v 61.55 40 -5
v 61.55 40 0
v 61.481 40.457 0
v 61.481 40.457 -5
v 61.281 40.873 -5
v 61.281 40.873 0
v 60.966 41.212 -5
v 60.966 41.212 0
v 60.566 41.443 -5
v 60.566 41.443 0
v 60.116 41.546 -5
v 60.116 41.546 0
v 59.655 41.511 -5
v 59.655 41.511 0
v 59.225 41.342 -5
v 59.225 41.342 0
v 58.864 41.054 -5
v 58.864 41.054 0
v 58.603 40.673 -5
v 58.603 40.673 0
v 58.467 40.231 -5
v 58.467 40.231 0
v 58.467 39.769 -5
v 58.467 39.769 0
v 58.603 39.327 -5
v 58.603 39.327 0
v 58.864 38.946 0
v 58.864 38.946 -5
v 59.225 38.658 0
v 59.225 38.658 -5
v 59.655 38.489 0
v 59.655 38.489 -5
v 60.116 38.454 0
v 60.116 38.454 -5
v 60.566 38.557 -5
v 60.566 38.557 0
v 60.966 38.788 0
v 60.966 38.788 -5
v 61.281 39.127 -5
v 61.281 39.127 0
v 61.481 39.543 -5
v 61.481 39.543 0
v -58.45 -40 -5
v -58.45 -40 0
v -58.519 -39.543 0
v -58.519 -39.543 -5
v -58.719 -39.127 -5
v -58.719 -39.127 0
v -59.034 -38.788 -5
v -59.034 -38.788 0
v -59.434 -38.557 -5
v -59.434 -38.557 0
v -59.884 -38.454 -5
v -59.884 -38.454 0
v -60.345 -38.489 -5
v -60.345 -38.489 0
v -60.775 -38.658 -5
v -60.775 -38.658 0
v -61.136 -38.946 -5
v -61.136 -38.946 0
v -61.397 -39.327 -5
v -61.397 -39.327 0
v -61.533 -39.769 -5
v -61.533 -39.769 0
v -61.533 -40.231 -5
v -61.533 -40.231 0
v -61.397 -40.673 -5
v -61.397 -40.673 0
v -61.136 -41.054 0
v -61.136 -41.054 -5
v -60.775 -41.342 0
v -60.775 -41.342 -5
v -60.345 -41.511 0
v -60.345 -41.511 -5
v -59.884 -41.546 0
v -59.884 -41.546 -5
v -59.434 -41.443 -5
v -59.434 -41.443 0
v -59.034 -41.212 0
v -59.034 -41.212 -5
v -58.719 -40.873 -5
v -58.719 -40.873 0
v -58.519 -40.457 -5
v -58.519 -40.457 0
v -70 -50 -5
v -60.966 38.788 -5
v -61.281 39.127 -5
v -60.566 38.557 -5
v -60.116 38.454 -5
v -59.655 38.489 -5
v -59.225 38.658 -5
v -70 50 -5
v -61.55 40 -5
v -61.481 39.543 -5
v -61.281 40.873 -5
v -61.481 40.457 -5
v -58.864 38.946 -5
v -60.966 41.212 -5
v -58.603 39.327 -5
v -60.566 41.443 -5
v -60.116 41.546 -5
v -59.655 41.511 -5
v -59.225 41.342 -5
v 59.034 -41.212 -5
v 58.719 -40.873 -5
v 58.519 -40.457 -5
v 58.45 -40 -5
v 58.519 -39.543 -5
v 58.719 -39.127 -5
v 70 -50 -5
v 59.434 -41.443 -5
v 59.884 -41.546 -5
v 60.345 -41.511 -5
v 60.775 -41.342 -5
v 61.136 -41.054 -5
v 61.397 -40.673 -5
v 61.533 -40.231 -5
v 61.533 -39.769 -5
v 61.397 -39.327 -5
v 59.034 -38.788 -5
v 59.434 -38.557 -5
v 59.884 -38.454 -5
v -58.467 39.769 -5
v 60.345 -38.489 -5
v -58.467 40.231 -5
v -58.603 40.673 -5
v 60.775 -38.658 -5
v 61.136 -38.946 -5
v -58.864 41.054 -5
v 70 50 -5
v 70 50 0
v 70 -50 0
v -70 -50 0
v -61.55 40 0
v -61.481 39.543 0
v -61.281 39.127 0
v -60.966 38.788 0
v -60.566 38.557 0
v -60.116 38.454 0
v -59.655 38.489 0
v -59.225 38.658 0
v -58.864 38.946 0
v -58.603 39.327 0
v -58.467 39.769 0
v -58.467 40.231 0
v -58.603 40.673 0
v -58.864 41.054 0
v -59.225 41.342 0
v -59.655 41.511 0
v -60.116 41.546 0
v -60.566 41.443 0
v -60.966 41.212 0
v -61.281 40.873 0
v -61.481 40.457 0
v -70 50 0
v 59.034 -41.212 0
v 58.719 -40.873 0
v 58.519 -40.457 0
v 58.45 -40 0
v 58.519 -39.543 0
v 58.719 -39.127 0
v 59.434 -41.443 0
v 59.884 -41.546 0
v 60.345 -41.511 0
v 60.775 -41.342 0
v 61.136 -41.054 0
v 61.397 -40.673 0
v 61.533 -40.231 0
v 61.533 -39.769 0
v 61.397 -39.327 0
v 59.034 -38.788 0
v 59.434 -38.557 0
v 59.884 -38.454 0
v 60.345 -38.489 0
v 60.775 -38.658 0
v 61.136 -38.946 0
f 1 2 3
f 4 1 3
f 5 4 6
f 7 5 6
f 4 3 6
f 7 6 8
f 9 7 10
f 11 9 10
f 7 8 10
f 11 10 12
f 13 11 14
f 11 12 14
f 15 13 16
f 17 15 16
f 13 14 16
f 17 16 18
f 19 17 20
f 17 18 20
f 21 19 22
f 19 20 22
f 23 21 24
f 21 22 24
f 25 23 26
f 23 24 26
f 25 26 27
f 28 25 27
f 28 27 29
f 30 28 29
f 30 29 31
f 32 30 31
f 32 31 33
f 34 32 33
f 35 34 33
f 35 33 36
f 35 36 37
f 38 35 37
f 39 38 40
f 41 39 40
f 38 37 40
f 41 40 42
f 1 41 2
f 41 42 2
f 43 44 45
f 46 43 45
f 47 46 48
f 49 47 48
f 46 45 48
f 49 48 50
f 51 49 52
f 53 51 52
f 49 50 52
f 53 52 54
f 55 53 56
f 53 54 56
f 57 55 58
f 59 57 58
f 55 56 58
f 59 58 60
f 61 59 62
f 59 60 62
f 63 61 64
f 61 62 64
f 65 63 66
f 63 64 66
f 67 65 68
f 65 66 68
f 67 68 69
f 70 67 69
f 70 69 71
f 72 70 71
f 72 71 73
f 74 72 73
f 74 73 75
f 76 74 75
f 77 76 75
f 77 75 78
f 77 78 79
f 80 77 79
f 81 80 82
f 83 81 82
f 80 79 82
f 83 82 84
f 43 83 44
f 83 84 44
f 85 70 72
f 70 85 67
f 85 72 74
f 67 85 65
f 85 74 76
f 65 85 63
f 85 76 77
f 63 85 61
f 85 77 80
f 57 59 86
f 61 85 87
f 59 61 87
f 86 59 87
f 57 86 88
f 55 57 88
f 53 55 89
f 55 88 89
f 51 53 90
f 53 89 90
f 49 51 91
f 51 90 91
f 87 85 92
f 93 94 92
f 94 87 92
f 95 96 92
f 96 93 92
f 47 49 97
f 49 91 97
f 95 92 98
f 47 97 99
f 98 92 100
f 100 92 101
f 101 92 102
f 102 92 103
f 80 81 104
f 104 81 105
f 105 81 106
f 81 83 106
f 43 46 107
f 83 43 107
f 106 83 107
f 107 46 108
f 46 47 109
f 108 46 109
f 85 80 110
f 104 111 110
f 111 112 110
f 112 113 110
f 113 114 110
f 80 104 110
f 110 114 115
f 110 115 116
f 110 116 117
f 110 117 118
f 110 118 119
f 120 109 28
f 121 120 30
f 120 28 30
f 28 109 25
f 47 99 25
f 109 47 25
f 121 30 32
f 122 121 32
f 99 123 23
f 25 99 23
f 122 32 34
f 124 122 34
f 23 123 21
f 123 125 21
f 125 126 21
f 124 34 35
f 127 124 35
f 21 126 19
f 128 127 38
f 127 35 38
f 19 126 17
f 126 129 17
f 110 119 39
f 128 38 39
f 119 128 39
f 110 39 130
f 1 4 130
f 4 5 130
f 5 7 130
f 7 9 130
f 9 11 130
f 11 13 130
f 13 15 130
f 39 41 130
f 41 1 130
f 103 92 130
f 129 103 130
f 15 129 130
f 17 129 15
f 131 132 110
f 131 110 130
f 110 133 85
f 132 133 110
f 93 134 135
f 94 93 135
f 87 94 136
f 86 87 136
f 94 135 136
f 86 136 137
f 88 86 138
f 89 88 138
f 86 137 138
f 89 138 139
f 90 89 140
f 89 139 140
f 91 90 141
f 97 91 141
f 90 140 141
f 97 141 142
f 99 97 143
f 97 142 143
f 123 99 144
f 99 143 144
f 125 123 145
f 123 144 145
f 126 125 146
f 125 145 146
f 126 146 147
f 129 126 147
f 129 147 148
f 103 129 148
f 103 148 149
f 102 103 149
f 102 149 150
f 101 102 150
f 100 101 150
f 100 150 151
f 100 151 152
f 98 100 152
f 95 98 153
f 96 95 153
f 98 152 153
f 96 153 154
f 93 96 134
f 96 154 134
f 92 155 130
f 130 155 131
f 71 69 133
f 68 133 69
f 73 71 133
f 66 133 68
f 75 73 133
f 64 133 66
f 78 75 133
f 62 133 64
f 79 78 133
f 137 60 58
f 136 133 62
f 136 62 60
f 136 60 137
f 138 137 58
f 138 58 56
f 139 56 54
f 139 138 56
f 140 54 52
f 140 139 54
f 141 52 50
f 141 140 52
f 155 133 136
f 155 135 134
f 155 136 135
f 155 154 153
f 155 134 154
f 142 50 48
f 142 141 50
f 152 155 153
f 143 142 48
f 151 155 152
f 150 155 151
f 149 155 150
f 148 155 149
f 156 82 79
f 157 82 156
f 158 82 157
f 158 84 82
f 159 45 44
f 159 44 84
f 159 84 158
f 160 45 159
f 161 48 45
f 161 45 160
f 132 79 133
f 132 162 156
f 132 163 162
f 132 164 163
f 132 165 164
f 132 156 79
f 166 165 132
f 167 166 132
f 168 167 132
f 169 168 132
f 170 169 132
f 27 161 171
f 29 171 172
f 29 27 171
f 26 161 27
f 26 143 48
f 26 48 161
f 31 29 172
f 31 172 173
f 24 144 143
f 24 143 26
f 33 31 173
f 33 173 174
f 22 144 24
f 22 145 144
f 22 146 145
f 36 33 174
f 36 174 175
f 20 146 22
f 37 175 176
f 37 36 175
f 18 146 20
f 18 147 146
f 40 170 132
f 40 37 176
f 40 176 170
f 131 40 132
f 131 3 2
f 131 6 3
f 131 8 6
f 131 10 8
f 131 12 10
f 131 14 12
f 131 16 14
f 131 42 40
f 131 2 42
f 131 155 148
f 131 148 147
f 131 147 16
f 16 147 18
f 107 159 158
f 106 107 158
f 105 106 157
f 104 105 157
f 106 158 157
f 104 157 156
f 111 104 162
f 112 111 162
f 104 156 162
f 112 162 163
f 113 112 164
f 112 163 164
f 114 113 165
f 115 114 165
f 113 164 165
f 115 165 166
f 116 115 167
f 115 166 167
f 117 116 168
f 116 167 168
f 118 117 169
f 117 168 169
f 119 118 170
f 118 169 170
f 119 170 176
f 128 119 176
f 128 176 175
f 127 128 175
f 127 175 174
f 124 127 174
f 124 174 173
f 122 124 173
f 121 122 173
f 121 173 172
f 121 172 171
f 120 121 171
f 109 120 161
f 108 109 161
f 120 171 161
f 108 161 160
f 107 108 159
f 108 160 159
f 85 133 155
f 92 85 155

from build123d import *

# Parameters (mm, degrees)
ESQUISSE1_W        = 140
ESQUISSE1_H        = 100
ESQUISSE1_R        = 1.55
BOSS_EXTRU_1_DEPTH = 5


with BuildPart() as part:
    # Esquisse1 → Boss.-Extru.1 (new body)
    with BuildSketch(Plane.XY):
        Rectangle(ESQUISSE1_W, ESQUISSE1_H)
        with Locations((-60, -40)):
            Circle(ESQUISSE1_R, mode=Mode.SUBTRACT)
        with Locations(Location((60, -40, 0), (0, 0, 180))):
            Circle(ESQUISSE1_R, mode=Mode.SUBTRACT)
        with Locations((60, 40)):
            Circle(ESQUISSE1_R, mode=Mode.SUBTRACT)
        with Locations(Location((-60, 40, 0), (0, 0, 180))):
            Circle(ESQUISSE1_R, mode=Mode.SUBTRACT)
    extrude(amount=-BOSS_EXTRU_1_DEPTH)


solid = part.part
